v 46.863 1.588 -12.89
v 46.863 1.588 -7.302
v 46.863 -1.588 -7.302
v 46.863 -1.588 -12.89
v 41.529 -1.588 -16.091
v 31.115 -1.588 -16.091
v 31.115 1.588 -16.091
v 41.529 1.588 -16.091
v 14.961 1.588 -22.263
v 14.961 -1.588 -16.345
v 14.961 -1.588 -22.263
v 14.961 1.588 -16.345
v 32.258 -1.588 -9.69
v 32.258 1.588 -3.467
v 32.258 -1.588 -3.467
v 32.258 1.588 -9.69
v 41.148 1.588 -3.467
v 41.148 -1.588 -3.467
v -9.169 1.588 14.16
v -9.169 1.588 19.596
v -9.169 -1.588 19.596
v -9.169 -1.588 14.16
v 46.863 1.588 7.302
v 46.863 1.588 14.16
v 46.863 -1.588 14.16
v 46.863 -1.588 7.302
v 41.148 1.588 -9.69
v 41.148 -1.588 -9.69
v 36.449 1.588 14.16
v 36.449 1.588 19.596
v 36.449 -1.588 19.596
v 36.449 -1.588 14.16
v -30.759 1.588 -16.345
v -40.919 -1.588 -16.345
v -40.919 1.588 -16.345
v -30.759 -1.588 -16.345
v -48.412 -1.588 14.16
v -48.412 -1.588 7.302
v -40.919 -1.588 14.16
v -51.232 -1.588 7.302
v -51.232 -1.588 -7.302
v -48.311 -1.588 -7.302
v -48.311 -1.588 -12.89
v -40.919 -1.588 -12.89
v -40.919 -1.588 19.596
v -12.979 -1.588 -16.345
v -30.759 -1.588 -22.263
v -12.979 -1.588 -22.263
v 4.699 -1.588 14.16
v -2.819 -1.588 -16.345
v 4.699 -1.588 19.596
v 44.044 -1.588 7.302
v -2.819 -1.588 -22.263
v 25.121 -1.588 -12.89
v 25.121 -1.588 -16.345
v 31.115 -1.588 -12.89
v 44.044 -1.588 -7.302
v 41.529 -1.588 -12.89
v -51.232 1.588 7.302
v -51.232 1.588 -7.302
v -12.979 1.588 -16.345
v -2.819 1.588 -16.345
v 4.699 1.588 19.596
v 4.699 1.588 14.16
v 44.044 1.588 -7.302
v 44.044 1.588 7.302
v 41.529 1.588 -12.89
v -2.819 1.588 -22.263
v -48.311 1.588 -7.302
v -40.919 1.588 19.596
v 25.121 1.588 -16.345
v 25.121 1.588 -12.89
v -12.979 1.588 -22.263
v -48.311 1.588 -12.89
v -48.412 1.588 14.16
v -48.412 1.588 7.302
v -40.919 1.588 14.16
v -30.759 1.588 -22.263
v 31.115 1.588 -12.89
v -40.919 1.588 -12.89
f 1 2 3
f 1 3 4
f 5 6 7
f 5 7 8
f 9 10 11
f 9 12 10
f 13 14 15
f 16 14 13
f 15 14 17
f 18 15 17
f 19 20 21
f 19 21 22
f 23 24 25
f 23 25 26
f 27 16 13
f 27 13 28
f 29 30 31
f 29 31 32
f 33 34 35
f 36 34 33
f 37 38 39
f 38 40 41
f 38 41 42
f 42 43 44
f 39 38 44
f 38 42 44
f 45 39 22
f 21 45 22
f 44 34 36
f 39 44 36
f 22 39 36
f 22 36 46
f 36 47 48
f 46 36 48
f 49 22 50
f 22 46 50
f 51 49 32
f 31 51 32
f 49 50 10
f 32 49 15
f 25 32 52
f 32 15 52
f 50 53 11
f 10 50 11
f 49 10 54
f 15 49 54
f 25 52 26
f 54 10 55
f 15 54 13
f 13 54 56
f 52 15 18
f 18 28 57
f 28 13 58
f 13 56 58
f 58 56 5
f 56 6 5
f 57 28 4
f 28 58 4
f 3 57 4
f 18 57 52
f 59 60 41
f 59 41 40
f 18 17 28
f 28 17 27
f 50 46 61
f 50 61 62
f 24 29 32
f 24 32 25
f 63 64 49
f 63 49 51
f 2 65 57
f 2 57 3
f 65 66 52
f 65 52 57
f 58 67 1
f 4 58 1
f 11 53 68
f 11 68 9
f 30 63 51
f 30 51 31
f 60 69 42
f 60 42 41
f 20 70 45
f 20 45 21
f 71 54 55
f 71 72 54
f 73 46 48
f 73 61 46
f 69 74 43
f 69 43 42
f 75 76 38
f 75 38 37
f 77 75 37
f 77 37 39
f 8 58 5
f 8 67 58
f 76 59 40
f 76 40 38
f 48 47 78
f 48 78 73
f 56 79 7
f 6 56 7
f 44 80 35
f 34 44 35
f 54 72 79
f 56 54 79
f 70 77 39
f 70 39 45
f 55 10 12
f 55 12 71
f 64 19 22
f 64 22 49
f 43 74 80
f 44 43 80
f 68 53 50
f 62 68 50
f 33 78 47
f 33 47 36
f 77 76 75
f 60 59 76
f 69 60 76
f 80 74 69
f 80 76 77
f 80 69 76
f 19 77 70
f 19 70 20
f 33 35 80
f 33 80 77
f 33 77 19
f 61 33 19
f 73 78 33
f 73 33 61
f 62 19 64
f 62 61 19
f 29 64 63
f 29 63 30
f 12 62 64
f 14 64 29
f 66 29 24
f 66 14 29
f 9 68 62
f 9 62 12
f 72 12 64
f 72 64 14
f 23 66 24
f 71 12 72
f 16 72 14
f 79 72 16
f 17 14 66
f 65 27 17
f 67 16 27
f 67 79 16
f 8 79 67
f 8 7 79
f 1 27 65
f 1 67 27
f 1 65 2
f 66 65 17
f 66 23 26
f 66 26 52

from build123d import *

# Parameters (mm, degrees)
BOSS_EXTRUDE2_DEPTH = 1.5875
SKETCH2_W           = 8.89
SKETCH2_H           = 6.223
CUT_EXTRUDE1_DEPTH  = 3.175
SKETCH4_W           = 7.3914
SKETCH4_H           = 1.27
SKETCH4_W_2         = 5.9944
SKETCH4_W_3         = 5.334
CUT_EXTRUDE2_DEPTH  = 57.051741709
SKETCH5_W           = 10.414
SKETCH5_H           = 0.635
SKETCH5_W_2         = 10.16
SKETCH5_H_2         = 0.7366
CUT_EXTRUDE3_DEPTH  = 57.051741709
SKETCH6_W           = 17.78
SKETCH6_H           = 0.254
CUT_EXTRUDE4_DEPTH  = 57.051741709
SKETCH7_W           = 10.414
SKETCH7_H           = 0.254
CUT_EXTRUDE5_DEPTH  = 56.950188363


with BuildPart() as part:
    # Sketch1 → Boss-Extrude2 (new, symmetric)
    with BuildSketch(Plane(origin=(0, 0, 0), x_dir=(1, 0, 0), z_dir=(0, 1, 0))):
        Polygon((-30.7594, 22.5171), (-30.7594, 17.0815), (-40.9194, 17.0815), (-40.9194, 14.1605), (-48.3108, 14.1605), (-48.3108, 7.3025), (-51.2318, 7.3025), (-51.2318, 0), (-51.2318, -7.3025), (-48.4124, -7.3025), (-48.4124, -14.1605), (-40.9194, -14.1605), (-40.9194, -19.5961), (-9.1694, -19.5961), (-9.1694, -14.1605), (4.699, -14.1605), (4.699, -19.5961), (36.449, -19.5961), (36.449, -14.1605), (46.863, -14.1605), (46.863, -7.3025), (44.0436, -7.3025), (44.0436, 0), (44.0436, 7.3025), (46.863, 7.3025), (46.863, 14.1605), (41.529, 14.1605), (41.529, 16.9799), (31.115, 16.9799), (31.115, 14.1605), (25.1206, 14.1605), (25.1206, 17.0815), (14.9606, 17.0815), (14.9606, 22.5171), (-2.8194, 22.5171), (-2.8194, 17.0815), (-12.9794, 17.0815), (-12.9794, 22.5171), align=None)
    extrude(amount=BOSS_EXTRUDE2_DEPTH, both=True)

    # Sketch2 → Cut-Extrude1 (cut)
    with BuildSketch(Plane(origin=(0, 1.5875, 0), x_dir=(1, 0, 0), z_dir=(0, 1, 0))):
        with Locations((36.703, 6.5786)):
            Rectangle(SKETCH2_W, SKETCH2_H)
    extrude(amount=-CUT_EXTRUDE1_DEPTH, mode=Mode.SUBTRACT)

    # Sketch4 → Cut-Extrude2 (cut, through all)
    with BuildSketch(Plane(origin=(0, 1.5875, 0), x_dir=(1, 0, 0), z_dir=(0, 1, 0))):
        with Locations((-44.6151, 13.5255)):
            Rectangle(SKETCH4_W, SKETCH4_H)
        with Locations((28.1178, 13.5255)):
            Rectangle(SKETCH4_W_2, SKETCH4_H)
        with Locations((44.196, 13.5255)):
            Rectangle(SKETCH4_W_3, SKETCH4_H)
    extrude(amount=-CUT_EXTRUDE2_DEPTH, mode=Mode.SUBTRACT)

    # Sketch5 → Cut-Extrude3 (cut, through all)
    with BuildSketch(Plane.XZ.offset(1.5875)):
        with Locations((36.322, -16.6624)):
            Rectangle(SKETCH5_W, SKETCH5_H)
        with Locations((20.0406, -16.7132)):
            Rectangle(SKETCH5_W_2, SKETCH5_H_2)
        with Locations((-7.8994, -16.7132)):
            Rectangle(SKETCH5_W_2, SKETCH5_H_2)
        with Locations((-35.8394, -16.7132)):
            Rectangle(SKETCH5_W_2, SKETCH5_H_2)
    extrude(amount=-CUT_EXTRUDE3_DEPTH, mode=Mode.SUBTRACT)

    # Sketch6 → Cut-Extrude4 (cut, through all)
    with BuildSketch(Plane.XZ.offset(1.5875)):
        with Locations((6.0706, -22.3901)):
            Rectangle(SKETCH6_W, SKETCH6_H)
        with Locations((-21.8694, -22.3901)):
            Rectangle(SKETCH6_W, SKETCH6_H)
    extrude(amount=-CUT_EXTRUDE4_DEPTH, mode=Mode.SUBTRACT)

    # Sketch7 → Cut-Extrude5 (cut, through all)
    with BuildSketch(Plane.XZ.offset(1.5875)):
        with Locations((36.322, -16.2179)):
            Rectangle(SKETCH7_W, SKETCH7_H)
    extrude(amount=-CUT_EXTRUDE5_DEPTH, mode=Mode.SUBTRACT)


solid = part.part
